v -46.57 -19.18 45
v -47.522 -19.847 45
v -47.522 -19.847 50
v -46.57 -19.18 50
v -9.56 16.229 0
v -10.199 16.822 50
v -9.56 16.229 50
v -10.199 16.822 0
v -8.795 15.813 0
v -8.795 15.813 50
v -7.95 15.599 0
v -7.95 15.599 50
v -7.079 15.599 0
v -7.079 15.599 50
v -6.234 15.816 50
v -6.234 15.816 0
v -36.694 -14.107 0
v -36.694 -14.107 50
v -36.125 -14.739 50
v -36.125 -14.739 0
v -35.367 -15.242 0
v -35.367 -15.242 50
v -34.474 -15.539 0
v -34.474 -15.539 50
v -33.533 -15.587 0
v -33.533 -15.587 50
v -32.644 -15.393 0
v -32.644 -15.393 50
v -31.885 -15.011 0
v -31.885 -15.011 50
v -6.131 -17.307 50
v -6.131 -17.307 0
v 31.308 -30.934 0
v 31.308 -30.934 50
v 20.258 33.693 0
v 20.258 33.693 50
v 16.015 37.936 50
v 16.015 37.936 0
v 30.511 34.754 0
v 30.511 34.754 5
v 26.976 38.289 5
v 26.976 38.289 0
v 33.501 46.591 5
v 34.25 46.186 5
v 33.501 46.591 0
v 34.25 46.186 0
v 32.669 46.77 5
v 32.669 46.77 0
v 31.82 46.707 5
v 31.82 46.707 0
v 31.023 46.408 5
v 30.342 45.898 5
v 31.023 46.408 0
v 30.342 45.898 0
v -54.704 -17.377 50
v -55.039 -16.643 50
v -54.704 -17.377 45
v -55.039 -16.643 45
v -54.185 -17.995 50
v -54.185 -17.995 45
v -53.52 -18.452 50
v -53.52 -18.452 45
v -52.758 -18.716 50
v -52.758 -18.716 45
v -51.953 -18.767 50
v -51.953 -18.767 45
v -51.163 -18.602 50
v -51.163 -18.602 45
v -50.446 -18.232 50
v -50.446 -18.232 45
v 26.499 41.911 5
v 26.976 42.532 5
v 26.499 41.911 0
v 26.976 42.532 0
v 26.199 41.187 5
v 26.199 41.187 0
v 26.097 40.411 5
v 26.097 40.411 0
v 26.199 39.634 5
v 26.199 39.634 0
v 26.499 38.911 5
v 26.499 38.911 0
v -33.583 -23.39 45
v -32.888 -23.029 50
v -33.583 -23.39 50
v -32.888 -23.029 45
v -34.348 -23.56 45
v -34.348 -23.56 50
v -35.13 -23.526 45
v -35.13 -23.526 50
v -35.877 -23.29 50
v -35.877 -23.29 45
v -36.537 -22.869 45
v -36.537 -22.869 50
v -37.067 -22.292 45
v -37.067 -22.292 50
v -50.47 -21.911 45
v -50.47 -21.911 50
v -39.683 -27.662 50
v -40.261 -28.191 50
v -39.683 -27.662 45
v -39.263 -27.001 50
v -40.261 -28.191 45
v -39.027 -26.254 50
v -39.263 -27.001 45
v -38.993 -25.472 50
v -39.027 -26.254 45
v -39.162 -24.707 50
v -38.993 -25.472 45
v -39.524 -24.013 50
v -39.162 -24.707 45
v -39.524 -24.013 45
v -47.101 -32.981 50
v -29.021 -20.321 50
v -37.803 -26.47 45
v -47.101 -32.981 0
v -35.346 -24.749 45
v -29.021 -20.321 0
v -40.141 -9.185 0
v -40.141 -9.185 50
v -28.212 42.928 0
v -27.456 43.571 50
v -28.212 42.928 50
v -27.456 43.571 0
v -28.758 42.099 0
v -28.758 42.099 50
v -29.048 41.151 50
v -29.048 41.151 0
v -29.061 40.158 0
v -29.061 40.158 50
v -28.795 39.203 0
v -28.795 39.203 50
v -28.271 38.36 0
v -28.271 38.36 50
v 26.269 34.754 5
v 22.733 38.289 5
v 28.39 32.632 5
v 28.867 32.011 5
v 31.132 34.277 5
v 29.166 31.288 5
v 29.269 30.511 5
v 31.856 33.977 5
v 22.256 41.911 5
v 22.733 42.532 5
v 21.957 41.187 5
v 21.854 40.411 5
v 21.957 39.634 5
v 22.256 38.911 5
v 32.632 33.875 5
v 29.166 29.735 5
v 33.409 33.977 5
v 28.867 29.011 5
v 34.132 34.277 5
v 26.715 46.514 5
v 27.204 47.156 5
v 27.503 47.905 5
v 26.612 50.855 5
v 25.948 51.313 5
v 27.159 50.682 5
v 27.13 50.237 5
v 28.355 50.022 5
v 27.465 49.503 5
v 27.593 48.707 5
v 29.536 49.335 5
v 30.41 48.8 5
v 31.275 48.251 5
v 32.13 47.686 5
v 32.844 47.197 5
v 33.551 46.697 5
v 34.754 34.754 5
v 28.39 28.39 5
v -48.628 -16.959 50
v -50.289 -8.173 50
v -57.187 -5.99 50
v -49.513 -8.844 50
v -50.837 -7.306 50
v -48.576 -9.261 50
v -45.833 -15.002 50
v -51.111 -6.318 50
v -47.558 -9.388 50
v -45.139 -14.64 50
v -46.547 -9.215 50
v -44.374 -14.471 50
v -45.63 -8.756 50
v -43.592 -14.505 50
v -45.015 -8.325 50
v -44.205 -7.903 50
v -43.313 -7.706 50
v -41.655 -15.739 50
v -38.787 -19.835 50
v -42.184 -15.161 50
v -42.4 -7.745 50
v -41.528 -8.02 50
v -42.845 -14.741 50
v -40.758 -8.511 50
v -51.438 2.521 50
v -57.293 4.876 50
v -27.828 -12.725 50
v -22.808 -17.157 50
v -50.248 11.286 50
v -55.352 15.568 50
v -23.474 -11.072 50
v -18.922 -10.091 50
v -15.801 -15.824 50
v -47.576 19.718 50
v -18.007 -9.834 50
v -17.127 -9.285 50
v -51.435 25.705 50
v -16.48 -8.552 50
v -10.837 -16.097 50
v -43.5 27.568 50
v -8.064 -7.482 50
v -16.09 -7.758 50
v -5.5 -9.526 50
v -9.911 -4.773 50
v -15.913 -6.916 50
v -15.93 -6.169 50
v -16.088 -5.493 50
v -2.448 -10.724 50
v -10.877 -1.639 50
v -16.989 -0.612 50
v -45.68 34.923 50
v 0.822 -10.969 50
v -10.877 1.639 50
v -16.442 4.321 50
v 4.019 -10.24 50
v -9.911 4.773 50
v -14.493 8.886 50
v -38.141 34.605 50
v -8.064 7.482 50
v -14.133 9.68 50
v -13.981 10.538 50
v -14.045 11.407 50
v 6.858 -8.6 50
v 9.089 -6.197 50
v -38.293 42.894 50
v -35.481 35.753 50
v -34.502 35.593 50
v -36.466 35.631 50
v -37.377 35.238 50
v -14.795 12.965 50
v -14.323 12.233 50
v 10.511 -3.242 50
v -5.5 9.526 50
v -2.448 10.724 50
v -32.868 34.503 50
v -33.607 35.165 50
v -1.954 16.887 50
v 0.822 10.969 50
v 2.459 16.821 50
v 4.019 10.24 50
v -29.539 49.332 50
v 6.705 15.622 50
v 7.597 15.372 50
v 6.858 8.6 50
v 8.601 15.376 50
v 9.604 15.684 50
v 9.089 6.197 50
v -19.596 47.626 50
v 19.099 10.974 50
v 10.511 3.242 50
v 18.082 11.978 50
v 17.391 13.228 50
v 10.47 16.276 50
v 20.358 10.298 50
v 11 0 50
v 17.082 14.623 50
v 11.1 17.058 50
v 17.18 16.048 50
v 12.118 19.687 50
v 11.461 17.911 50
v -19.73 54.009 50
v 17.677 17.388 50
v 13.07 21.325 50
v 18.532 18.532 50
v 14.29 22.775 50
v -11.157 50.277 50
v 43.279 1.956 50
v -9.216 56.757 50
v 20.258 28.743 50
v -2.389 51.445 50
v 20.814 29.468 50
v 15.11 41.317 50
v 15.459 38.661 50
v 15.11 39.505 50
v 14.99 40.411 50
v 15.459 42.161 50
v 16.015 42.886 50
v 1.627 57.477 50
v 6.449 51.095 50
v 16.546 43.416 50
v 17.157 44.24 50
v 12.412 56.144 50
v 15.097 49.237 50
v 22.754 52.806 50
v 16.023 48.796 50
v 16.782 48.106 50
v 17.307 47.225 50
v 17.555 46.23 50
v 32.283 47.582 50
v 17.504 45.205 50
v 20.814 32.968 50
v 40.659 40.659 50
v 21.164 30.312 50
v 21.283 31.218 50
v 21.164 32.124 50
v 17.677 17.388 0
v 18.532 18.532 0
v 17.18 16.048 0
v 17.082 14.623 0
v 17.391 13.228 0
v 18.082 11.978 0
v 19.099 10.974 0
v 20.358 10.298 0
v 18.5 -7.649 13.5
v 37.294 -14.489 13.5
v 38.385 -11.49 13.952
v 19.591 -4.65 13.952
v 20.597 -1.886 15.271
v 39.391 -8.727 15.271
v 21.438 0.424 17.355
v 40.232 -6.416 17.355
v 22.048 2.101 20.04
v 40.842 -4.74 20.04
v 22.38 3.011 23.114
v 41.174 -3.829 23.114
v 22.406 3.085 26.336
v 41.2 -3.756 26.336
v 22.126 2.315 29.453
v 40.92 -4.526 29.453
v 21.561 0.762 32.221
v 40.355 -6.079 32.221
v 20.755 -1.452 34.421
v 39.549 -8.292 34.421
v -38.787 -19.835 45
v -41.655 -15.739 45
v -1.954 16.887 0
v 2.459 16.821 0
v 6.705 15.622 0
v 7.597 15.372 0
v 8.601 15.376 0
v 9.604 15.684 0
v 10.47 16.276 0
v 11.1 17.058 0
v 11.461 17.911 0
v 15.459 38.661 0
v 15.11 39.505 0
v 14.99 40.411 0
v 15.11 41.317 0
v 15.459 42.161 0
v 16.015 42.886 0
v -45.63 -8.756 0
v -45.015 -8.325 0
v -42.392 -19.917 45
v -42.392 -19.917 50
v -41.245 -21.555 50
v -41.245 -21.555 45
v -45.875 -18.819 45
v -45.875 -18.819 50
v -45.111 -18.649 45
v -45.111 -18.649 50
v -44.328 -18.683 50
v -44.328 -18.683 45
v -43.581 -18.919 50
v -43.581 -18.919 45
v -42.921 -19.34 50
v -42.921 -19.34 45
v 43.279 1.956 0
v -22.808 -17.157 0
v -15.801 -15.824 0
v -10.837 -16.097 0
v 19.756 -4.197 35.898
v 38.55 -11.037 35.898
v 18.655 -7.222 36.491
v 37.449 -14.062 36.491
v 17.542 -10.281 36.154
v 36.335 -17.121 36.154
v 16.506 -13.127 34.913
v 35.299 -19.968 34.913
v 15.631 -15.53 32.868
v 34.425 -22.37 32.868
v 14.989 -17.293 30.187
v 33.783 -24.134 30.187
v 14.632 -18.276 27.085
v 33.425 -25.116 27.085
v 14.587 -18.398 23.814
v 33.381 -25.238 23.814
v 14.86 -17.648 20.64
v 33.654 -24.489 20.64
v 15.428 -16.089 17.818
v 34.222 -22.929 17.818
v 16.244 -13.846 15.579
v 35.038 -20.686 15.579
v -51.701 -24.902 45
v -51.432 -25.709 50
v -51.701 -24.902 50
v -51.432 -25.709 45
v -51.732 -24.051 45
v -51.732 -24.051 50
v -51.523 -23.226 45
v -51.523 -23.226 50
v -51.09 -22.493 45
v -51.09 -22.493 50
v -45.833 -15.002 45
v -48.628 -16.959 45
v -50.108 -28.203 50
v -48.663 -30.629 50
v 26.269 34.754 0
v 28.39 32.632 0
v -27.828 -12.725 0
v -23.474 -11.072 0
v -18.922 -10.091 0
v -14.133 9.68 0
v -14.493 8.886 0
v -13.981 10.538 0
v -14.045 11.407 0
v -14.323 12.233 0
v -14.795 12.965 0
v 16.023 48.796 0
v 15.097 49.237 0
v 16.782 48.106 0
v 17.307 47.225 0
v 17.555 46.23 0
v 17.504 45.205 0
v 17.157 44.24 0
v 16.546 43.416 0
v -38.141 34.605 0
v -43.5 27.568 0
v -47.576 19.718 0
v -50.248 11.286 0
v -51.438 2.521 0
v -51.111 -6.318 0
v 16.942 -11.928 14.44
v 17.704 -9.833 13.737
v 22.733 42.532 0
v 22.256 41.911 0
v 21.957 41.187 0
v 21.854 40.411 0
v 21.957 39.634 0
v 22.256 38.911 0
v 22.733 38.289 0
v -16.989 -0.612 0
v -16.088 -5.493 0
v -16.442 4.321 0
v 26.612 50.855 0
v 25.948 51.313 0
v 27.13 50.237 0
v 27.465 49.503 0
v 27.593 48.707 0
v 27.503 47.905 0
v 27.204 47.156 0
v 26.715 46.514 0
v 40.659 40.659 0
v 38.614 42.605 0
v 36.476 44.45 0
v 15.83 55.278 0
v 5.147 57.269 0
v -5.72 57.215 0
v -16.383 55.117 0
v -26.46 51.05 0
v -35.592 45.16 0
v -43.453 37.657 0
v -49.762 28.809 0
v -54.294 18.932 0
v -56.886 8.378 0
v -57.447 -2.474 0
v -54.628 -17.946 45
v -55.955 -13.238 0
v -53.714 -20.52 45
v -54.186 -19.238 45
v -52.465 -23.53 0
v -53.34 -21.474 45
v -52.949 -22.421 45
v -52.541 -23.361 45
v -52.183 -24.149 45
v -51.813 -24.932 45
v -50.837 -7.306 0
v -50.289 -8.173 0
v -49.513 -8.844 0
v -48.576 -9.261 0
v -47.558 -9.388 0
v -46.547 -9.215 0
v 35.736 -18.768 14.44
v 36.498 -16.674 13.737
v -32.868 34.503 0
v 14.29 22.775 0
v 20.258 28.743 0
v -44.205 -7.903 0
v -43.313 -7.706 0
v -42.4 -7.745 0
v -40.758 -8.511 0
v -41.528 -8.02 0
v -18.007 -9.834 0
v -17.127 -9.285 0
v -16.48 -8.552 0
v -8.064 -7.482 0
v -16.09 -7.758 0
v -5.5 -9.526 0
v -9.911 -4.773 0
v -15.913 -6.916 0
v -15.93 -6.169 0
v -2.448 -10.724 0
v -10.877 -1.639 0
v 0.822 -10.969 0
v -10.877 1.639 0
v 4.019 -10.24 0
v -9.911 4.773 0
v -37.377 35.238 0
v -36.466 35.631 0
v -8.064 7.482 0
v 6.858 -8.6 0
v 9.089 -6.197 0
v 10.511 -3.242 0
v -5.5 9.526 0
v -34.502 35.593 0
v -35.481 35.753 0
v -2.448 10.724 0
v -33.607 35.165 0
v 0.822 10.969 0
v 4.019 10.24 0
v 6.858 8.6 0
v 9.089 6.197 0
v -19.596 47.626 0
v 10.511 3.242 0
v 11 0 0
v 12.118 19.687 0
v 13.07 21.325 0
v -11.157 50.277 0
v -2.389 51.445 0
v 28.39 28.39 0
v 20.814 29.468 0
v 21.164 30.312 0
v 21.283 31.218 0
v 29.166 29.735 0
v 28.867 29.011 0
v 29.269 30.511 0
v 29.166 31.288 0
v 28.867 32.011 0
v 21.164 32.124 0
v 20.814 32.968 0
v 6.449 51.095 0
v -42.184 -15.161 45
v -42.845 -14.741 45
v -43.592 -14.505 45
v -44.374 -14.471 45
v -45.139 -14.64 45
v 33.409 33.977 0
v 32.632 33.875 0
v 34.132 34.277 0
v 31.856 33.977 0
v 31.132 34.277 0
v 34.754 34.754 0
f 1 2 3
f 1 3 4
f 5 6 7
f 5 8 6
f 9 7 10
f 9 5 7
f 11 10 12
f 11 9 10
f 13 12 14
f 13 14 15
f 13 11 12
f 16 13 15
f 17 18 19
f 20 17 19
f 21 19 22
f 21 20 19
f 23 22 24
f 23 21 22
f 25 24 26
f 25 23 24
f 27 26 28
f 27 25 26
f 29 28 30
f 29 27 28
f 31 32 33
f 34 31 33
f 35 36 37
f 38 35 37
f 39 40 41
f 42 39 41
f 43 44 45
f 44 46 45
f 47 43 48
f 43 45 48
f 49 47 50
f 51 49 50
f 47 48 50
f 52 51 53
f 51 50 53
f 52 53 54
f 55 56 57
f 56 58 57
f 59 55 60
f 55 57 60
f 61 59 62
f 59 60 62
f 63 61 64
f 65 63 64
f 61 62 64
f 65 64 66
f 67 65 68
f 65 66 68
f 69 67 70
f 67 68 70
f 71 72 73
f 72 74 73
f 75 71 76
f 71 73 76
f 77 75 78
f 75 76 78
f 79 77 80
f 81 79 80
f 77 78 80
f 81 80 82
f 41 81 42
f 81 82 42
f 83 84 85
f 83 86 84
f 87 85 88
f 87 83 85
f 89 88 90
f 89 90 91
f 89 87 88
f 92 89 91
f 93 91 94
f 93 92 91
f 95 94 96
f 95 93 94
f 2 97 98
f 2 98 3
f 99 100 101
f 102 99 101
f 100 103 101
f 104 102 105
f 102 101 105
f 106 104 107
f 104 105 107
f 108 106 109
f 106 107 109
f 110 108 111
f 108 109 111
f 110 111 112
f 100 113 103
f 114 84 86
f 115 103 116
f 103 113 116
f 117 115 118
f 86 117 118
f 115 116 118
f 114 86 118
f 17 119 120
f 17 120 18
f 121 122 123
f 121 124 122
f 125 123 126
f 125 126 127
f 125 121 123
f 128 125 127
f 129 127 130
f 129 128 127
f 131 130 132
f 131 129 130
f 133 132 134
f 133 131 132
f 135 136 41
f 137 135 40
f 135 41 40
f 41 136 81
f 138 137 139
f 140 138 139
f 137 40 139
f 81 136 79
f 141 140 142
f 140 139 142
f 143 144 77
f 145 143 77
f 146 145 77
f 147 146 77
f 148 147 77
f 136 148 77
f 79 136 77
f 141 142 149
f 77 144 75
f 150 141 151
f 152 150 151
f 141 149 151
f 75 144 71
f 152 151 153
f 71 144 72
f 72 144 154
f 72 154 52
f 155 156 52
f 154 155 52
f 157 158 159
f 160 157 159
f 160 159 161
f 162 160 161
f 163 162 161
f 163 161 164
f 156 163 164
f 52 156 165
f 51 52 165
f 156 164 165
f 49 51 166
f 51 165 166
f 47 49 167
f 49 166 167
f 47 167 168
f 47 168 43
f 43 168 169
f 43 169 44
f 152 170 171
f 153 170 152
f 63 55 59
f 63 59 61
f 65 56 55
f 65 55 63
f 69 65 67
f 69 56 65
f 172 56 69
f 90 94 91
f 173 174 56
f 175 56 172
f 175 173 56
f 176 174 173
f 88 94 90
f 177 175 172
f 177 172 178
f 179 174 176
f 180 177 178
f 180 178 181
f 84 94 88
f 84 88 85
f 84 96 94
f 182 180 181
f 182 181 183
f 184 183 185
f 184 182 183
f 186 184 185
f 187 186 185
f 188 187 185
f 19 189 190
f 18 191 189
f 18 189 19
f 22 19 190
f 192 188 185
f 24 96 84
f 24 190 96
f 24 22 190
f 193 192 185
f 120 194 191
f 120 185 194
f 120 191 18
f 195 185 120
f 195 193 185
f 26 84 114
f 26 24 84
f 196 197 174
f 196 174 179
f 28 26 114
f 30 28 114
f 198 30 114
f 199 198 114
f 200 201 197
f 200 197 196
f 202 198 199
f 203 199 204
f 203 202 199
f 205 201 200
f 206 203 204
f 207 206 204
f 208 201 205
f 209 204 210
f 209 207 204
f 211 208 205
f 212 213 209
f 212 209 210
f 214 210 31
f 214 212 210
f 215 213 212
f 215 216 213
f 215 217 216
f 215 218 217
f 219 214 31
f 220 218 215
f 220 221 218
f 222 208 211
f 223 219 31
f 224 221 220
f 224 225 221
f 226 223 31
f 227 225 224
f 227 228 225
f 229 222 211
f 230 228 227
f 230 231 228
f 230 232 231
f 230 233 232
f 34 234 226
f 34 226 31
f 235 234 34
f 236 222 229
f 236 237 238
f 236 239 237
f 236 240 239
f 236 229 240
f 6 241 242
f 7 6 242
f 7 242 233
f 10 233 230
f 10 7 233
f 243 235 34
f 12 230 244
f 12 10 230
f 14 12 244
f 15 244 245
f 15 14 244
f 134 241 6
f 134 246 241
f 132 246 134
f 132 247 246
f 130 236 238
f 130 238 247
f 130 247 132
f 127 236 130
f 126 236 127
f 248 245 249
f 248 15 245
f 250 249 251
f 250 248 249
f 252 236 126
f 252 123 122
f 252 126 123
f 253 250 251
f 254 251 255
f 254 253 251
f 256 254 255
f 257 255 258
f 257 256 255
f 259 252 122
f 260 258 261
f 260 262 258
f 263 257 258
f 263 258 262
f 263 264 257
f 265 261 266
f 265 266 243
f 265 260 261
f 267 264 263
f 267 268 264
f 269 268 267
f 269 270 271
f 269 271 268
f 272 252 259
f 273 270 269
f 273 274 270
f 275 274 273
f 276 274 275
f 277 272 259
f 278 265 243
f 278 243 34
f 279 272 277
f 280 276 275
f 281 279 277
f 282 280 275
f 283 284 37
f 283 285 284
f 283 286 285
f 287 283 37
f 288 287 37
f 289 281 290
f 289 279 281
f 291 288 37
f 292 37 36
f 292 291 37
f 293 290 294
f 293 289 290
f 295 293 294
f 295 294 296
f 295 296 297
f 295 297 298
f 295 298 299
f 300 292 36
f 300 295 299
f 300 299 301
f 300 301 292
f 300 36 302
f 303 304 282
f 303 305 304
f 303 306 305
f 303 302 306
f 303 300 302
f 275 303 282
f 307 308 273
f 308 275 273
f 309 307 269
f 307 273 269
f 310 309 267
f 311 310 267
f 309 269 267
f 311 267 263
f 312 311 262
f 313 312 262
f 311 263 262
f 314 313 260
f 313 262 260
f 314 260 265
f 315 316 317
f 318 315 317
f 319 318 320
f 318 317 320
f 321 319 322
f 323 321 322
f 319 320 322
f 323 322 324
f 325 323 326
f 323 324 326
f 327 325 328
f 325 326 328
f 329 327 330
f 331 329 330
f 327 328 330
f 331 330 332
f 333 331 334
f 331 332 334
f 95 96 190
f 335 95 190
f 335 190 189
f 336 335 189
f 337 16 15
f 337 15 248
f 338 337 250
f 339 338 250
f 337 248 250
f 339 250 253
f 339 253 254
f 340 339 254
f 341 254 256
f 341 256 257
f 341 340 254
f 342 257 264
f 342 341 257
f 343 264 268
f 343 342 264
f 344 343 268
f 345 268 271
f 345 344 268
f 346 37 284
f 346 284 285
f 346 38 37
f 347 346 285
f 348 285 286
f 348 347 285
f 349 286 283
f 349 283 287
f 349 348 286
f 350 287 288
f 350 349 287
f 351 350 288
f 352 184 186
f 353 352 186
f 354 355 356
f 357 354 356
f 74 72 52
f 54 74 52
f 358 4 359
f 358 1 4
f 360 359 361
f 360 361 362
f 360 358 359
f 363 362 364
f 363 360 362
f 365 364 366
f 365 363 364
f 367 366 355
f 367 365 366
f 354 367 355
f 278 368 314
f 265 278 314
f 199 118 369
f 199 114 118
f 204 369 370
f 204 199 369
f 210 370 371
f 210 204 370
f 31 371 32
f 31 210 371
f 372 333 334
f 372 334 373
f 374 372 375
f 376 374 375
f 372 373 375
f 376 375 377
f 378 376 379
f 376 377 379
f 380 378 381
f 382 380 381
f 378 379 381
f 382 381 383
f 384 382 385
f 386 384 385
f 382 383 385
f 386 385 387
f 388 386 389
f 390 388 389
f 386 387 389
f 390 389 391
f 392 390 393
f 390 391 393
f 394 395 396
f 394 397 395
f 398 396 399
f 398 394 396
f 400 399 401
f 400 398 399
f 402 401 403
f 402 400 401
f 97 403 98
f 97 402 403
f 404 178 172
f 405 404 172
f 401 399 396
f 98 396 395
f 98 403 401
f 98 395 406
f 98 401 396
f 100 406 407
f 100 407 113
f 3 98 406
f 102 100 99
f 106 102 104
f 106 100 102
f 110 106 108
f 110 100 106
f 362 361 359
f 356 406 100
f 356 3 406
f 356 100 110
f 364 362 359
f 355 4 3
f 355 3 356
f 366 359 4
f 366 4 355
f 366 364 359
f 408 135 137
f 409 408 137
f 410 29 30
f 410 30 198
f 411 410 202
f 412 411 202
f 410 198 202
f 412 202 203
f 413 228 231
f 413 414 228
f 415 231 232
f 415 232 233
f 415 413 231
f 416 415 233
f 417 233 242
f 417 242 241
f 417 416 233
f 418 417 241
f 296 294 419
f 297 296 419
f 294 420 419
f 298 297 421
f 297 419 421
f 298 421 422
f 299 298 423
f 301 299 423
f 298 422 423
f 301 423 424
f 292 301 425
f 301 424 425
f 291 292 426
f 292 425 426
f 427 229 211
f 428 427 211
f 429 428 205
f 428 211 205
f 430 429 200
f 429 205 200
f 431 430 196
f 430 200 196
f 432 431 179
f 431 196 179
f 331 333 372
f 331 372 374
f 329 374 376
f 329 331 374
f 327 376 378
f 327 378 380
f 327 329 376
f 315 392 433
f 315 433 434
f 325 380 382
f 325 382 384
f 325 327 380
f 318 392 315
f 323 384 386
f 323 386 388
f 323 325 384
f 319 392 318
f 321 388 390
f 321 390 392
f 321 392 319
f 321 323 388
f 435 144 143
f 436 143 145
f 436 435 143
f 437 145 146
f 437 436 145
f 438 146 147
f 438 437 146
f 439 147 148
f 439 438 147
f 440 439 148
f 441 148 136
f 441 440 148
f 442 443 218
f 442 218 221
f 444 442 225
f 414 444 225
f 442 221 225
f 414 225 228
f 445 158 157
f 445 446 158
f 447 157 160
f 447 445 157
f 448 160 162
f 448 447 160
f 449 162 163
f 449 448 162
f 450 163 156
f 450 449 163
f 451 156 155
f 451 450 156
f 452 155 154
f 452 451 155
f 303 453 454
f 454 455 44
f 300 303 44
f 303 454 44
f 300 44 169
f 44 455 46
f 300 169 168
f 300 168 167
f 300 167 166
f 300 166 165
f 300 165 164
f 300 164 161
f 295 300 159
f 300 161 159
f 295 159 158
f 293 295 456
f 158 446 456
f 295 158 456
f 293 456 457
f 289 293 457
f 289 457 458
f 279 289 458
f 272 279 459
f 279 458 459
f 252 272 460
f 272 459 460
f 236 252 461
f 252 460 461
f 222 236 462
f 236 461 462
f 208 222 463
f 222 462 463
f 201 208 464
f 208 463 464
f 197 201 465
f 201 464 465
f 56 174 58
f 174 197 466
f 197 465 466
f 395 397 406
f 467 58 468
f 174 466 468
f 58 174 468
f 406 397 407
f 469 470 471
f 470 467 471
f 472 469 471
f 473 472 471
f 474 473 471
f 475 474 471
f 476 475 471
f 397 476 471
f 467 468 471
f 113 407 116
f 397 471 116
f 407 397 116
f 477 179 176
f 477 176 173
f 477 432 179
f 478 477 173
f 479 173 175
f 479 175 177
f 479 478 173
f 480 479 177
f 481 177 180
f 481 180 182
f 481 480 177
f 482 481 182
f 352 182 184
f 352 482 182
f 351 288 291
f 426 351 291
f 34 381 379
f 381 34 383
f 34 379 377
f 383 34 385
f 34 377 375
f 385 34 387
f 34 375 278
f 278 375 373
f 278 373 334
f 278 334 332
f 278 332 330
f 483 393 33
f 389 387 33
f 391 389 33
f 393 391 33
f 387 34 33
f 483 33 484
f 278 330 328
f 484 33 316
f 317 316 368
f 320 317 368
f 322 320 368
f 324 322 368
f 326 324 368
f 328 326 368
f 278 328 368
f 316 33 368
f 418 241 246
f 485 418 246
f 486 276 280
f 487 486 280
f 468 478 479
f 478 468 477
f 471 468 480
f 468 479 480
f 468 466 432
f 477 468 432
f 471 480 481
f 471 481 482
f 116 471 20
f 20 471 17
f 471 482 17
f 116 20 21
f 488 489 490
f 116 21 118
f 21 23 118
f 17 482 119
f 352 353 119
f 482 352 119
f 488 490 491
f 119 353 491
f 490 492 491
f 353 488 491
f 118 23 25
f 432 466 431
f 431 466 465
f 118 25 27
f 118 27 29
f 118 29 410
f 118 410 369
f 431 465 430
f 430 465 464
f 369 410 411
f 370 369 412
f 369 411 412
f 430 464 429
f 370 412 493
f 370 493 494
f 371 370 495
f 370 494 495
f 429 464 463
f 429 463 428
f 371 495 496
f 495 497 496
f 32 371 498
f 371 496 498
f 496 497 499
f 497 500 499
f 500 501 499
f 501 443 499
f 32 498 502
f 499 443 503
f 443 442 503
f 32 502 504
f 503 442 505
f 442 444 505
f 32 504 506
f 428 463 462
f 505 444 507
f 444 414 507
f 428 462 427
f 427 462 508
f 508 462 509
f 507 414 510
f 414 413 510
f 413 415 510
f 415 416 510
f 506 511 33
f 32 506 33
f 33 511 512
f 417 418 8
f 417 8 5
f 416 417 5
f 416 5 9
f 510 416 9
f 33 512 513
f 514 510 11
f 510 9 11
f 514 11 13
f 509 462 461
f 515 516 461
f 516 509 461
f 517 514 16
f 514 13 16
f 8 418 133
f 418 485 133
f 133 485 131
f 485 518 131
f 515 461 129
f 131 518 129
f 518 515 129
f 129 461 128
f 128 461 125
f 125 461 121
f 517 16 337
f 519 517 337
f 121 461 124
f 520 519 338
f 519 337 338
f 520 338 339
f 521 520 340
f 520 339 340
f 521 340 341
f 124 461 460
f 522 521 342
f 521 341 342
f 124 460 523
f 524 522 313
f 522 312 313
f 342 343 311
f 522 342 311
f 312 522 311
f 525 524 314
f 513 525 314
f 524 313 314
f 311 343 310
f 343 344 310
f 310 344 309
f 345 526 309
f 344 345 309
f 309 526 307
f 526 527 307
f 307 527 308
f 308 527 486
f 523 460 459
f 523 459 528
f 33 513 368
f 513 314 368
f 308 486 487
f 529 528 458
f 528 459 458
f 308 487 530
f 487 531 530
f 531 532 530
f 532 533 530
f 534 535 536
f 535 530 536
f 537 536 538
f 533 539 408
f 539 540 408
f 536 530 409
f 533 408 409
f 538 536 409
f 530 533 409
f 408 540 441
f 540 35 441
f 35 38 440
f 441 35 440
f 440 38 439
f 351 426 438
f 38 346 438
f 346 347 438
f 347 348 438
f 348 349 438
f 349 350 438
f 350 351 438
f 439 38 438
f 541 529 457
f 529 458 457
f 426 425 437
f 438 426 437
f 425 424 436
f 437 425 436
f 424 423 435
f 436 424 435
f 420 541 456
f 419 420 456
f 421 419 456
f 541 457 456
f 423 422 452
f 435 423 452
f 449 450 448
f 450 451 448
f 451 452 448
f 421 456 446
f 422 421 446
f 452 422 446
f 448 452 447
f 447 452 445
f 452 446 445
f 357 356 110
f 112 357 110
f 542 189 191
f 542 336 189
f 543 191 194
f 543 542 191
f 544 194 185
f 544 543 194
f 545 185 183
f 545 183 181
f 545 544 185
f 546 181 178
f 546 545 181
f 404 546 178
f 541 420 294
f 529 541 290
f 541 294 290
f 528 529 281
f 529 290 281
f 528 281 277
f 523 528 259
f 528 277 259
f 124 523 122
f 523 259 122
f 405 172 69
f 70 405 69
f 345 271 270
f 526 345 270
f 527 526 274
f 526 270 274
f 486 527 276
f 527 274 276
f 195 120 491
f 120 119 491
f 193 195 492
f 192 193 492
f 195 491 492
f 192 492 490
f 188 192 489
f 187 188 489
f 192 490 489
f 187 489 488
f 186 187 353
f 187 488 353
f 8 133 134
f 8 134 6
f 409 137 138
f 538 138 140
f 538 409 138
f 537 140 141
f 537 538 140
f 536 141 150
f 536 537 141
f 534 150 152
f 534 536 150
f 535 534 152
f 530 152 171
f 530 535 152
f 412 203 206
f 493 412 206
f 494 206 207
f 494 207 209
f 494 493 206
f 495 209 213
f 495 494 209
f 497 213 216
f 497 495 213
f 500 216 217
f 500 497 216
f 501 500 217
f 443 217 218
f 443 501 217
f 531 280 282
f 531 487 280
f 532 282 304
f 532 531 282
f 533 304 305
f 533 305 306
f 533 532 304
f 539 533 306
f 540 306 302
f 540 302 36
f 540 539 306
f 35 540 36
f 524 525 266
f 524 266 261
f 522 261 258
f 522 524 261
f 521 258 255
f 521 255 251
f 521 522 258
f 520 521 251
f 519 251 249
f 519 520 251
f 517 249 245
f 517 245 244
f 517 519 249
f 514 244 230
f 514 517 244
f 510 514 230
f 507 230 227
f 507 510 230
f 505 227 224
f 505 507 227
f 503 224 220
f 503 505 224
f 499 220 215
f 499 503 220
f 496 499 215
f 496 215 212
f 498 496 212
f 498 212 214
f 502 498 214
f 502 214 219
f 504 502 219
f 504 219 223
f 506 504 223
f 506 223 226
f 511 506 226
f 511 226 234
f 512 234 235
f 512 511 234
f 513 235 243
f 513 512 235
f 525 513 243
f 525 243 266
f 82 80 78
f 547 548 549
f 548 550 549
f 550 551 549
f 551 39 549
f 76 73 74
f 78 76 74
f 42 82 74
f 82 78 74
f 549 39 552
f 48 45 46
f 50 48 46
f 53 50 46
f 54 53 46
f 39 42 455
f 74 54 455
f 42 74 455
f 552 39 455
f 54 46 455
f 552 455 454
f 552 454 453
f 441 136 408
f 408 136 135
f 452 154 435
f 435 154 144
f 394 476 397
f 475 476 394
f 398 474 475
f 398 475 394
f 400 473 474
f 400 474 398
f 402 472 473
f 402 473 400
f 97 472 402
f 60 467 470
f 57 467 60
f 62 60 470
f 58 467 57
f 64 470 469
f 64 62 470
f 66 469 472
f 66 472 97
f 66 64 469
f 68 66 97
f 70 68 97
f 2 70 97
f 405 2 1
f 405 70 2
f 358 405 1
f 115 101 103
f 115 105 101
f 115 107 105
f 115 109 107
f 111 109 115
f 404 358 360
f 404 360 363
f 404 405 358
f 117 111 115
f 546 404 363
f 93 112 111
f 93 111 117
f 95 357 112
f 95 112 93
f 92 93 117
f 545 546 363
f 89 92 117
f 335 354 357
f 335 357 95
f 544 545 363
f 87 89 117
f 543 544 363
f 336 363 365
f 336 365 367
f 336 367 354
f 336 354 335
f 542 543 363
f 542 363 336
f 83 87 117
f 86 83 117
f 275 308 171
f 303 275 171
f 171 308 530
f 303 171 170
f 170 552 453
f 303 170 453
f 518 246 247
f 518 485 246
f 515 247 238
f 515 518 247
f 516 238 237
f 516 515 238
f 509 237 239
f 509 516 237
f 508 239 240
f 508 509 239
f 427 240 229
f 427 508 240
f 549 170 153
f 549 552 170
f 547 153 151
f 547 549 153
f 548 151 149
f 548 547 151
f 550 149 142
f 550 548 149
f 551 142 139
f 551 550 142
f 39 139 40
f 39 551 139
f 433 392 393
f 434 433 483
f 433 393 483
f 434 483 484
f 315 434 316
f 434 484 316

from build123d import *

# Parameters (mm, degrees)
SKETCH1_R           = 11
BOSS_EXTRUDE1_DEPTH = 50
FILLET2_R           = 25
FILLET5_R           = 5
CUT_EXTRUDE2_DEPTH  = 50
FILLET6_R           = 3.5
CUT_EXTRUDE3_DEPTH  = 5
CUT_EXTRUDE4_START  = -45
CUT_EXTRUDE4_DEPTH  = 5
CUT_EXTRUDE1_DEPTH  = 20
FILLET8_R           = 3


with BuildPart() as part:
    # Sketch1 → Boss-Extrude1 (new body)
    with BuildSketch(Plane.XY):
        with BuildLine():
            Line((-47.101242547, -32.98064509), (-15.03971276, -10.530920247))
            ThreePointArc((-15.03971276, -10.530920247), (-11.176920202, -14.566045997), (-6.279523746, -17.252849698))
            Line((-6.279523746, -17.252849698), (31.308181085, -30.933655431))
            Line((31.308181085, -30.933655431), (43.278886102, 1.955586297))
            Line((43.278886102, 1.955586297), (12.982550619, 12.982550619))
            Line((12.982550619, 12.982550619), (40.658639918, 40.658639918))
            ThreePointArc((40.658639918, 40.658639918), (-36.960287557, 44.047555479), (-47.101242547, -32.98064509))
        make_face()
        Circle(SKETCH1_R, mode=Mode.SUBTRACT)
    extrude(amount=BOSS_EXTRUDE1_DEPTH)

    # Fillet2
    fillet2_edges = [part.edges().sort_by_distance(p)[0] for p in [
        (-15.03971276, -10.530920247, 25),
    ]]
    fillet(fillet2_edges, radius=FILLET2_R)

    # Fillet5
    fillet5_edges = [part.edges().sort_by_distance(p)[0] for p in [
        (12.982550619, 12.982550619, 25),
    ]]
    fillet(fillet5_edges, radius=FILLET5_R)

    # Sketch4 → Cut-Extrude2 (cut)
    with BuildSketch(Plane.XY.offset(50)):
        with BuildLine():
            Line((-42.148022243, -6.317645709), (-34.691528571, -16.966622285))
            Line((-34.691528571, -16.966622285), (-32.46214687, -15.405592412))
            ThreePointArc((-32.46214687, -15.405592412), (-23.62229066, -11.116679876), (-13.884259621, -9.809553241))
            ThreePointArc((-13.884259621, -9.809553241), (-16.986342471, 0.681299827), (-13.054027301, 10.890012453))
            Line((-13.054027301, 10.890012453), (-35.345481592, 37.455933189))
            ThreePointArc((-35.345481592, 37.455933189), (-49.339432978, 14.76043202), (-50.108305856, -11.891496301))
            Line((-50.108305856, -11.891496301), (-42.148022243, -6.317645709))
        make_face()
        with BuildLine():
            ThreePointArc((20.41205375, 47.282111435), (-5.968485267, 51.152978248), (-30.749214933, 41.312658847))
            Line((-30.749214933, 41.312658847), (-8.457760642, 14.746738111))
            ThreePointArc((-8.457760642, 14.746738111), (1.75926732, 16.908724922), (11.312388901, 12.68975403))
            ThreePointArc((11.312388901, 12.68975403), (11.517857333, 18.111100205), (14.289586512, 22.774867886))
            Line((14.289586512, 22.774867886), (22.732981885, 31.218263259))
            Line((22.732981885, 31.218263259), (13.54059373, 40.410651415))
            Line((13.54059373, 40.410651415), (20.41205375, 47.282111435))
        make_face()
    extrude(amount=-CUT_EXTRUDE2_DEPTH, mode=Mode.SUBTRACT)

    # Fillet6
    fillet6_edges = [part.edges().sort_by_distance(p)[0] for p in [
        (-13.884259621, -9.809553241, 25),
        (-13.054027301, 10.890012453, 25),
        (-35.345481592, 37.455933189, 25),
        (-30.749214933, 41.312658847, 25),
        (-8.457760642, 14.746738111, 25),
        (11.312388901, 12.68975403, 25),
        (-50.108305856, -11.891496301, 25),
        (-34.691528571, -16.966622285, 25),
        (-42.148022243, -6.317645709, 25),
        (22.732981885, 31.218263259, 25),
        (13.54059373, 40.410651415, 25),
        (20.41205375, 47.282111435, 25),
    ]]
    fillet(fillet6_edges, radius=FILLET6_R)

    # Sketch4<3> → Cut-Extrude3 (cut)
    with BuildSketch(Plane.XY.offset(50)):
        with BuildLine():
            Line((-52.540659522, -23.360845383), (-47.522133036, -19.846835307))
            ThreePointArc((-47.522133036, -19.846835307), (-48.096606551, -18.411041206), (-48.627711525, -16.958645933))
            Line((-48.627711525, -16.958645933), (-53.713864559, -20.520008628))
            ThreePointArc((-53.713864559, -20.520008628), (-53.146246907, -21.948267351), (-52.540659522, -23.360845383))
        make_face()
        with BuildLine():
            Line((-44.112627107, -17.459473554), (-41.244744925, -21.555233775))
            Line((-41.244744925, -21.555233775), (-38.787288792, -19.834504466))
            Line((-38.787288792, -19.834504466), (-43.375900283, -13.281288112))
            Line((-43.375900283, -13.281288112), (-48.627711525, -16.958645933))
            ThreePointArc((-48.627711525, -16.958645933), (-48.096606551, -18.411041206), (-47.522133036, -19.846835307))
            Line((-47.522133036, -19.846835307), (-44.112627107, -17.459473554))
        make_face()
        Polygon((-38.787288792, -19.834504466), (-41.244744925, -21.555233775), (-37.803286307, -26.470146041), (-35.345830174, -24.749416732), align=None)
    extrude(amount=-CUT_EXTRUDE3_DEPTH, mode=Mode.SUBTRACT)

    # Sketch4<4> → Cut-Extrude4 (cut)
    with BuildSketch(Plane.XY.offset(50).offset(CUT_EXTRUDE4_START)):
        with BuildLine():
            ThreePointArc((32.12953143, 47.685880616), (30.843572778, 48.527559369), (29.535578285, 49.334568158))
            Line((29.535578285, 49.334568158), (25.145119486, 44.944109359))
            ThreePointArc((25.145119486, 44.944109359), (26.4832242, 44.168867271), (27.797449084, 43.35379827))
            Line((27.797449084, 43.35379827), (32.12953143, 47.685880616))
        make_face()
        with BuildLine():
            ThreePointArc((27.797449084, 43.35379827), (26.4832242, 44.168867271), (25.145119486, 44.944109359))
            Line((25.145119486, 44.944109359), (20.611661542, 40.410651415))
            Line((20.611661542, 40.410651415), (26.268515791, 34.753797165))
            Line((26.268515791, 34.753797165), (28.389836135, 36.875117509))
            Line((28.389836135, 36.875117509), (24.854302229, 40.410651415))
            Line((24.854302229, 40.410651415), (27.797449084, 43.35379827))
        make_face()
        Polygon((28.389836135, 36.875117509), (26.268515791, 34.753797165), (30.511156478, 30.511156478), (32.632476822, 32.632476822), align=None)
    extrude(amount=-CUT_EXTRUDE4_DEPTH, mode=Mode.SUBTRACT)

    # Sketch2 → Cut-Extrude1 (cut)
    with BuildSketch(Plane(origin=(37.587704831, -13.680805733, 0), x_dir=(0, 0, -1), z_dir=(0.939692620785907, -0.34202014332567265, 0))):
        with BuildLine():
            ThreePointArc((-13.5, -0.86009916), (-21.542647074, 10.107886559), (-34.421167086, 5.7347178))
            Line((-34.421167086, 5.7347178), (-15.578832914, -7.45491612))
            ThreePointArc((-15.578832914, -7.45491612), (-14.03201428, -4.317452086), (-13.5, -0.86009916))
        make_face()
        with BuildLine():
            Line((-15.578832914, -7.45491612), (-34.421167086, 5.7347178))
            ThreePointArc((-34.421167086, 5.7347178), (-31.59481696, -10.281266246), (-15.578832914, -7.45491612))
        make_face()
    extrude(amount=-CUT_EXTRUDE1_DEPTH, mode=Mode.SUBTRACT)

    # Fillet8
    fillet8_edges = [part.edges().sort_by_distance(p)[0] for p in [
        (-44.112627107, -17.459473554, 47.5),
        (-52.540659522, -23.360845383, 47.5),
        (-53.713864559, -20.520008628, 47.5),
        (-43.375900283, -13.281288112, 47.5),
        (-35.345830174, -24.749416732, 47.5),
        (-37.803286307, -26.470146041, 47.5),
        (30.511156478, 30.511156478, 2.5),
        (32.632476822, 32.632476822, 2.5),
        (24.854302229, 40.410651415, 2.5),
        (32.12953143, 47.685880616, 2.5),
        (29.535578285, 49.334568158, 2.5),
        (20.611661542, 40.410651415, 2.5),
    ]]
    fillet(fillet8_edges, radius=FILLET8_R)


solid = part.part
